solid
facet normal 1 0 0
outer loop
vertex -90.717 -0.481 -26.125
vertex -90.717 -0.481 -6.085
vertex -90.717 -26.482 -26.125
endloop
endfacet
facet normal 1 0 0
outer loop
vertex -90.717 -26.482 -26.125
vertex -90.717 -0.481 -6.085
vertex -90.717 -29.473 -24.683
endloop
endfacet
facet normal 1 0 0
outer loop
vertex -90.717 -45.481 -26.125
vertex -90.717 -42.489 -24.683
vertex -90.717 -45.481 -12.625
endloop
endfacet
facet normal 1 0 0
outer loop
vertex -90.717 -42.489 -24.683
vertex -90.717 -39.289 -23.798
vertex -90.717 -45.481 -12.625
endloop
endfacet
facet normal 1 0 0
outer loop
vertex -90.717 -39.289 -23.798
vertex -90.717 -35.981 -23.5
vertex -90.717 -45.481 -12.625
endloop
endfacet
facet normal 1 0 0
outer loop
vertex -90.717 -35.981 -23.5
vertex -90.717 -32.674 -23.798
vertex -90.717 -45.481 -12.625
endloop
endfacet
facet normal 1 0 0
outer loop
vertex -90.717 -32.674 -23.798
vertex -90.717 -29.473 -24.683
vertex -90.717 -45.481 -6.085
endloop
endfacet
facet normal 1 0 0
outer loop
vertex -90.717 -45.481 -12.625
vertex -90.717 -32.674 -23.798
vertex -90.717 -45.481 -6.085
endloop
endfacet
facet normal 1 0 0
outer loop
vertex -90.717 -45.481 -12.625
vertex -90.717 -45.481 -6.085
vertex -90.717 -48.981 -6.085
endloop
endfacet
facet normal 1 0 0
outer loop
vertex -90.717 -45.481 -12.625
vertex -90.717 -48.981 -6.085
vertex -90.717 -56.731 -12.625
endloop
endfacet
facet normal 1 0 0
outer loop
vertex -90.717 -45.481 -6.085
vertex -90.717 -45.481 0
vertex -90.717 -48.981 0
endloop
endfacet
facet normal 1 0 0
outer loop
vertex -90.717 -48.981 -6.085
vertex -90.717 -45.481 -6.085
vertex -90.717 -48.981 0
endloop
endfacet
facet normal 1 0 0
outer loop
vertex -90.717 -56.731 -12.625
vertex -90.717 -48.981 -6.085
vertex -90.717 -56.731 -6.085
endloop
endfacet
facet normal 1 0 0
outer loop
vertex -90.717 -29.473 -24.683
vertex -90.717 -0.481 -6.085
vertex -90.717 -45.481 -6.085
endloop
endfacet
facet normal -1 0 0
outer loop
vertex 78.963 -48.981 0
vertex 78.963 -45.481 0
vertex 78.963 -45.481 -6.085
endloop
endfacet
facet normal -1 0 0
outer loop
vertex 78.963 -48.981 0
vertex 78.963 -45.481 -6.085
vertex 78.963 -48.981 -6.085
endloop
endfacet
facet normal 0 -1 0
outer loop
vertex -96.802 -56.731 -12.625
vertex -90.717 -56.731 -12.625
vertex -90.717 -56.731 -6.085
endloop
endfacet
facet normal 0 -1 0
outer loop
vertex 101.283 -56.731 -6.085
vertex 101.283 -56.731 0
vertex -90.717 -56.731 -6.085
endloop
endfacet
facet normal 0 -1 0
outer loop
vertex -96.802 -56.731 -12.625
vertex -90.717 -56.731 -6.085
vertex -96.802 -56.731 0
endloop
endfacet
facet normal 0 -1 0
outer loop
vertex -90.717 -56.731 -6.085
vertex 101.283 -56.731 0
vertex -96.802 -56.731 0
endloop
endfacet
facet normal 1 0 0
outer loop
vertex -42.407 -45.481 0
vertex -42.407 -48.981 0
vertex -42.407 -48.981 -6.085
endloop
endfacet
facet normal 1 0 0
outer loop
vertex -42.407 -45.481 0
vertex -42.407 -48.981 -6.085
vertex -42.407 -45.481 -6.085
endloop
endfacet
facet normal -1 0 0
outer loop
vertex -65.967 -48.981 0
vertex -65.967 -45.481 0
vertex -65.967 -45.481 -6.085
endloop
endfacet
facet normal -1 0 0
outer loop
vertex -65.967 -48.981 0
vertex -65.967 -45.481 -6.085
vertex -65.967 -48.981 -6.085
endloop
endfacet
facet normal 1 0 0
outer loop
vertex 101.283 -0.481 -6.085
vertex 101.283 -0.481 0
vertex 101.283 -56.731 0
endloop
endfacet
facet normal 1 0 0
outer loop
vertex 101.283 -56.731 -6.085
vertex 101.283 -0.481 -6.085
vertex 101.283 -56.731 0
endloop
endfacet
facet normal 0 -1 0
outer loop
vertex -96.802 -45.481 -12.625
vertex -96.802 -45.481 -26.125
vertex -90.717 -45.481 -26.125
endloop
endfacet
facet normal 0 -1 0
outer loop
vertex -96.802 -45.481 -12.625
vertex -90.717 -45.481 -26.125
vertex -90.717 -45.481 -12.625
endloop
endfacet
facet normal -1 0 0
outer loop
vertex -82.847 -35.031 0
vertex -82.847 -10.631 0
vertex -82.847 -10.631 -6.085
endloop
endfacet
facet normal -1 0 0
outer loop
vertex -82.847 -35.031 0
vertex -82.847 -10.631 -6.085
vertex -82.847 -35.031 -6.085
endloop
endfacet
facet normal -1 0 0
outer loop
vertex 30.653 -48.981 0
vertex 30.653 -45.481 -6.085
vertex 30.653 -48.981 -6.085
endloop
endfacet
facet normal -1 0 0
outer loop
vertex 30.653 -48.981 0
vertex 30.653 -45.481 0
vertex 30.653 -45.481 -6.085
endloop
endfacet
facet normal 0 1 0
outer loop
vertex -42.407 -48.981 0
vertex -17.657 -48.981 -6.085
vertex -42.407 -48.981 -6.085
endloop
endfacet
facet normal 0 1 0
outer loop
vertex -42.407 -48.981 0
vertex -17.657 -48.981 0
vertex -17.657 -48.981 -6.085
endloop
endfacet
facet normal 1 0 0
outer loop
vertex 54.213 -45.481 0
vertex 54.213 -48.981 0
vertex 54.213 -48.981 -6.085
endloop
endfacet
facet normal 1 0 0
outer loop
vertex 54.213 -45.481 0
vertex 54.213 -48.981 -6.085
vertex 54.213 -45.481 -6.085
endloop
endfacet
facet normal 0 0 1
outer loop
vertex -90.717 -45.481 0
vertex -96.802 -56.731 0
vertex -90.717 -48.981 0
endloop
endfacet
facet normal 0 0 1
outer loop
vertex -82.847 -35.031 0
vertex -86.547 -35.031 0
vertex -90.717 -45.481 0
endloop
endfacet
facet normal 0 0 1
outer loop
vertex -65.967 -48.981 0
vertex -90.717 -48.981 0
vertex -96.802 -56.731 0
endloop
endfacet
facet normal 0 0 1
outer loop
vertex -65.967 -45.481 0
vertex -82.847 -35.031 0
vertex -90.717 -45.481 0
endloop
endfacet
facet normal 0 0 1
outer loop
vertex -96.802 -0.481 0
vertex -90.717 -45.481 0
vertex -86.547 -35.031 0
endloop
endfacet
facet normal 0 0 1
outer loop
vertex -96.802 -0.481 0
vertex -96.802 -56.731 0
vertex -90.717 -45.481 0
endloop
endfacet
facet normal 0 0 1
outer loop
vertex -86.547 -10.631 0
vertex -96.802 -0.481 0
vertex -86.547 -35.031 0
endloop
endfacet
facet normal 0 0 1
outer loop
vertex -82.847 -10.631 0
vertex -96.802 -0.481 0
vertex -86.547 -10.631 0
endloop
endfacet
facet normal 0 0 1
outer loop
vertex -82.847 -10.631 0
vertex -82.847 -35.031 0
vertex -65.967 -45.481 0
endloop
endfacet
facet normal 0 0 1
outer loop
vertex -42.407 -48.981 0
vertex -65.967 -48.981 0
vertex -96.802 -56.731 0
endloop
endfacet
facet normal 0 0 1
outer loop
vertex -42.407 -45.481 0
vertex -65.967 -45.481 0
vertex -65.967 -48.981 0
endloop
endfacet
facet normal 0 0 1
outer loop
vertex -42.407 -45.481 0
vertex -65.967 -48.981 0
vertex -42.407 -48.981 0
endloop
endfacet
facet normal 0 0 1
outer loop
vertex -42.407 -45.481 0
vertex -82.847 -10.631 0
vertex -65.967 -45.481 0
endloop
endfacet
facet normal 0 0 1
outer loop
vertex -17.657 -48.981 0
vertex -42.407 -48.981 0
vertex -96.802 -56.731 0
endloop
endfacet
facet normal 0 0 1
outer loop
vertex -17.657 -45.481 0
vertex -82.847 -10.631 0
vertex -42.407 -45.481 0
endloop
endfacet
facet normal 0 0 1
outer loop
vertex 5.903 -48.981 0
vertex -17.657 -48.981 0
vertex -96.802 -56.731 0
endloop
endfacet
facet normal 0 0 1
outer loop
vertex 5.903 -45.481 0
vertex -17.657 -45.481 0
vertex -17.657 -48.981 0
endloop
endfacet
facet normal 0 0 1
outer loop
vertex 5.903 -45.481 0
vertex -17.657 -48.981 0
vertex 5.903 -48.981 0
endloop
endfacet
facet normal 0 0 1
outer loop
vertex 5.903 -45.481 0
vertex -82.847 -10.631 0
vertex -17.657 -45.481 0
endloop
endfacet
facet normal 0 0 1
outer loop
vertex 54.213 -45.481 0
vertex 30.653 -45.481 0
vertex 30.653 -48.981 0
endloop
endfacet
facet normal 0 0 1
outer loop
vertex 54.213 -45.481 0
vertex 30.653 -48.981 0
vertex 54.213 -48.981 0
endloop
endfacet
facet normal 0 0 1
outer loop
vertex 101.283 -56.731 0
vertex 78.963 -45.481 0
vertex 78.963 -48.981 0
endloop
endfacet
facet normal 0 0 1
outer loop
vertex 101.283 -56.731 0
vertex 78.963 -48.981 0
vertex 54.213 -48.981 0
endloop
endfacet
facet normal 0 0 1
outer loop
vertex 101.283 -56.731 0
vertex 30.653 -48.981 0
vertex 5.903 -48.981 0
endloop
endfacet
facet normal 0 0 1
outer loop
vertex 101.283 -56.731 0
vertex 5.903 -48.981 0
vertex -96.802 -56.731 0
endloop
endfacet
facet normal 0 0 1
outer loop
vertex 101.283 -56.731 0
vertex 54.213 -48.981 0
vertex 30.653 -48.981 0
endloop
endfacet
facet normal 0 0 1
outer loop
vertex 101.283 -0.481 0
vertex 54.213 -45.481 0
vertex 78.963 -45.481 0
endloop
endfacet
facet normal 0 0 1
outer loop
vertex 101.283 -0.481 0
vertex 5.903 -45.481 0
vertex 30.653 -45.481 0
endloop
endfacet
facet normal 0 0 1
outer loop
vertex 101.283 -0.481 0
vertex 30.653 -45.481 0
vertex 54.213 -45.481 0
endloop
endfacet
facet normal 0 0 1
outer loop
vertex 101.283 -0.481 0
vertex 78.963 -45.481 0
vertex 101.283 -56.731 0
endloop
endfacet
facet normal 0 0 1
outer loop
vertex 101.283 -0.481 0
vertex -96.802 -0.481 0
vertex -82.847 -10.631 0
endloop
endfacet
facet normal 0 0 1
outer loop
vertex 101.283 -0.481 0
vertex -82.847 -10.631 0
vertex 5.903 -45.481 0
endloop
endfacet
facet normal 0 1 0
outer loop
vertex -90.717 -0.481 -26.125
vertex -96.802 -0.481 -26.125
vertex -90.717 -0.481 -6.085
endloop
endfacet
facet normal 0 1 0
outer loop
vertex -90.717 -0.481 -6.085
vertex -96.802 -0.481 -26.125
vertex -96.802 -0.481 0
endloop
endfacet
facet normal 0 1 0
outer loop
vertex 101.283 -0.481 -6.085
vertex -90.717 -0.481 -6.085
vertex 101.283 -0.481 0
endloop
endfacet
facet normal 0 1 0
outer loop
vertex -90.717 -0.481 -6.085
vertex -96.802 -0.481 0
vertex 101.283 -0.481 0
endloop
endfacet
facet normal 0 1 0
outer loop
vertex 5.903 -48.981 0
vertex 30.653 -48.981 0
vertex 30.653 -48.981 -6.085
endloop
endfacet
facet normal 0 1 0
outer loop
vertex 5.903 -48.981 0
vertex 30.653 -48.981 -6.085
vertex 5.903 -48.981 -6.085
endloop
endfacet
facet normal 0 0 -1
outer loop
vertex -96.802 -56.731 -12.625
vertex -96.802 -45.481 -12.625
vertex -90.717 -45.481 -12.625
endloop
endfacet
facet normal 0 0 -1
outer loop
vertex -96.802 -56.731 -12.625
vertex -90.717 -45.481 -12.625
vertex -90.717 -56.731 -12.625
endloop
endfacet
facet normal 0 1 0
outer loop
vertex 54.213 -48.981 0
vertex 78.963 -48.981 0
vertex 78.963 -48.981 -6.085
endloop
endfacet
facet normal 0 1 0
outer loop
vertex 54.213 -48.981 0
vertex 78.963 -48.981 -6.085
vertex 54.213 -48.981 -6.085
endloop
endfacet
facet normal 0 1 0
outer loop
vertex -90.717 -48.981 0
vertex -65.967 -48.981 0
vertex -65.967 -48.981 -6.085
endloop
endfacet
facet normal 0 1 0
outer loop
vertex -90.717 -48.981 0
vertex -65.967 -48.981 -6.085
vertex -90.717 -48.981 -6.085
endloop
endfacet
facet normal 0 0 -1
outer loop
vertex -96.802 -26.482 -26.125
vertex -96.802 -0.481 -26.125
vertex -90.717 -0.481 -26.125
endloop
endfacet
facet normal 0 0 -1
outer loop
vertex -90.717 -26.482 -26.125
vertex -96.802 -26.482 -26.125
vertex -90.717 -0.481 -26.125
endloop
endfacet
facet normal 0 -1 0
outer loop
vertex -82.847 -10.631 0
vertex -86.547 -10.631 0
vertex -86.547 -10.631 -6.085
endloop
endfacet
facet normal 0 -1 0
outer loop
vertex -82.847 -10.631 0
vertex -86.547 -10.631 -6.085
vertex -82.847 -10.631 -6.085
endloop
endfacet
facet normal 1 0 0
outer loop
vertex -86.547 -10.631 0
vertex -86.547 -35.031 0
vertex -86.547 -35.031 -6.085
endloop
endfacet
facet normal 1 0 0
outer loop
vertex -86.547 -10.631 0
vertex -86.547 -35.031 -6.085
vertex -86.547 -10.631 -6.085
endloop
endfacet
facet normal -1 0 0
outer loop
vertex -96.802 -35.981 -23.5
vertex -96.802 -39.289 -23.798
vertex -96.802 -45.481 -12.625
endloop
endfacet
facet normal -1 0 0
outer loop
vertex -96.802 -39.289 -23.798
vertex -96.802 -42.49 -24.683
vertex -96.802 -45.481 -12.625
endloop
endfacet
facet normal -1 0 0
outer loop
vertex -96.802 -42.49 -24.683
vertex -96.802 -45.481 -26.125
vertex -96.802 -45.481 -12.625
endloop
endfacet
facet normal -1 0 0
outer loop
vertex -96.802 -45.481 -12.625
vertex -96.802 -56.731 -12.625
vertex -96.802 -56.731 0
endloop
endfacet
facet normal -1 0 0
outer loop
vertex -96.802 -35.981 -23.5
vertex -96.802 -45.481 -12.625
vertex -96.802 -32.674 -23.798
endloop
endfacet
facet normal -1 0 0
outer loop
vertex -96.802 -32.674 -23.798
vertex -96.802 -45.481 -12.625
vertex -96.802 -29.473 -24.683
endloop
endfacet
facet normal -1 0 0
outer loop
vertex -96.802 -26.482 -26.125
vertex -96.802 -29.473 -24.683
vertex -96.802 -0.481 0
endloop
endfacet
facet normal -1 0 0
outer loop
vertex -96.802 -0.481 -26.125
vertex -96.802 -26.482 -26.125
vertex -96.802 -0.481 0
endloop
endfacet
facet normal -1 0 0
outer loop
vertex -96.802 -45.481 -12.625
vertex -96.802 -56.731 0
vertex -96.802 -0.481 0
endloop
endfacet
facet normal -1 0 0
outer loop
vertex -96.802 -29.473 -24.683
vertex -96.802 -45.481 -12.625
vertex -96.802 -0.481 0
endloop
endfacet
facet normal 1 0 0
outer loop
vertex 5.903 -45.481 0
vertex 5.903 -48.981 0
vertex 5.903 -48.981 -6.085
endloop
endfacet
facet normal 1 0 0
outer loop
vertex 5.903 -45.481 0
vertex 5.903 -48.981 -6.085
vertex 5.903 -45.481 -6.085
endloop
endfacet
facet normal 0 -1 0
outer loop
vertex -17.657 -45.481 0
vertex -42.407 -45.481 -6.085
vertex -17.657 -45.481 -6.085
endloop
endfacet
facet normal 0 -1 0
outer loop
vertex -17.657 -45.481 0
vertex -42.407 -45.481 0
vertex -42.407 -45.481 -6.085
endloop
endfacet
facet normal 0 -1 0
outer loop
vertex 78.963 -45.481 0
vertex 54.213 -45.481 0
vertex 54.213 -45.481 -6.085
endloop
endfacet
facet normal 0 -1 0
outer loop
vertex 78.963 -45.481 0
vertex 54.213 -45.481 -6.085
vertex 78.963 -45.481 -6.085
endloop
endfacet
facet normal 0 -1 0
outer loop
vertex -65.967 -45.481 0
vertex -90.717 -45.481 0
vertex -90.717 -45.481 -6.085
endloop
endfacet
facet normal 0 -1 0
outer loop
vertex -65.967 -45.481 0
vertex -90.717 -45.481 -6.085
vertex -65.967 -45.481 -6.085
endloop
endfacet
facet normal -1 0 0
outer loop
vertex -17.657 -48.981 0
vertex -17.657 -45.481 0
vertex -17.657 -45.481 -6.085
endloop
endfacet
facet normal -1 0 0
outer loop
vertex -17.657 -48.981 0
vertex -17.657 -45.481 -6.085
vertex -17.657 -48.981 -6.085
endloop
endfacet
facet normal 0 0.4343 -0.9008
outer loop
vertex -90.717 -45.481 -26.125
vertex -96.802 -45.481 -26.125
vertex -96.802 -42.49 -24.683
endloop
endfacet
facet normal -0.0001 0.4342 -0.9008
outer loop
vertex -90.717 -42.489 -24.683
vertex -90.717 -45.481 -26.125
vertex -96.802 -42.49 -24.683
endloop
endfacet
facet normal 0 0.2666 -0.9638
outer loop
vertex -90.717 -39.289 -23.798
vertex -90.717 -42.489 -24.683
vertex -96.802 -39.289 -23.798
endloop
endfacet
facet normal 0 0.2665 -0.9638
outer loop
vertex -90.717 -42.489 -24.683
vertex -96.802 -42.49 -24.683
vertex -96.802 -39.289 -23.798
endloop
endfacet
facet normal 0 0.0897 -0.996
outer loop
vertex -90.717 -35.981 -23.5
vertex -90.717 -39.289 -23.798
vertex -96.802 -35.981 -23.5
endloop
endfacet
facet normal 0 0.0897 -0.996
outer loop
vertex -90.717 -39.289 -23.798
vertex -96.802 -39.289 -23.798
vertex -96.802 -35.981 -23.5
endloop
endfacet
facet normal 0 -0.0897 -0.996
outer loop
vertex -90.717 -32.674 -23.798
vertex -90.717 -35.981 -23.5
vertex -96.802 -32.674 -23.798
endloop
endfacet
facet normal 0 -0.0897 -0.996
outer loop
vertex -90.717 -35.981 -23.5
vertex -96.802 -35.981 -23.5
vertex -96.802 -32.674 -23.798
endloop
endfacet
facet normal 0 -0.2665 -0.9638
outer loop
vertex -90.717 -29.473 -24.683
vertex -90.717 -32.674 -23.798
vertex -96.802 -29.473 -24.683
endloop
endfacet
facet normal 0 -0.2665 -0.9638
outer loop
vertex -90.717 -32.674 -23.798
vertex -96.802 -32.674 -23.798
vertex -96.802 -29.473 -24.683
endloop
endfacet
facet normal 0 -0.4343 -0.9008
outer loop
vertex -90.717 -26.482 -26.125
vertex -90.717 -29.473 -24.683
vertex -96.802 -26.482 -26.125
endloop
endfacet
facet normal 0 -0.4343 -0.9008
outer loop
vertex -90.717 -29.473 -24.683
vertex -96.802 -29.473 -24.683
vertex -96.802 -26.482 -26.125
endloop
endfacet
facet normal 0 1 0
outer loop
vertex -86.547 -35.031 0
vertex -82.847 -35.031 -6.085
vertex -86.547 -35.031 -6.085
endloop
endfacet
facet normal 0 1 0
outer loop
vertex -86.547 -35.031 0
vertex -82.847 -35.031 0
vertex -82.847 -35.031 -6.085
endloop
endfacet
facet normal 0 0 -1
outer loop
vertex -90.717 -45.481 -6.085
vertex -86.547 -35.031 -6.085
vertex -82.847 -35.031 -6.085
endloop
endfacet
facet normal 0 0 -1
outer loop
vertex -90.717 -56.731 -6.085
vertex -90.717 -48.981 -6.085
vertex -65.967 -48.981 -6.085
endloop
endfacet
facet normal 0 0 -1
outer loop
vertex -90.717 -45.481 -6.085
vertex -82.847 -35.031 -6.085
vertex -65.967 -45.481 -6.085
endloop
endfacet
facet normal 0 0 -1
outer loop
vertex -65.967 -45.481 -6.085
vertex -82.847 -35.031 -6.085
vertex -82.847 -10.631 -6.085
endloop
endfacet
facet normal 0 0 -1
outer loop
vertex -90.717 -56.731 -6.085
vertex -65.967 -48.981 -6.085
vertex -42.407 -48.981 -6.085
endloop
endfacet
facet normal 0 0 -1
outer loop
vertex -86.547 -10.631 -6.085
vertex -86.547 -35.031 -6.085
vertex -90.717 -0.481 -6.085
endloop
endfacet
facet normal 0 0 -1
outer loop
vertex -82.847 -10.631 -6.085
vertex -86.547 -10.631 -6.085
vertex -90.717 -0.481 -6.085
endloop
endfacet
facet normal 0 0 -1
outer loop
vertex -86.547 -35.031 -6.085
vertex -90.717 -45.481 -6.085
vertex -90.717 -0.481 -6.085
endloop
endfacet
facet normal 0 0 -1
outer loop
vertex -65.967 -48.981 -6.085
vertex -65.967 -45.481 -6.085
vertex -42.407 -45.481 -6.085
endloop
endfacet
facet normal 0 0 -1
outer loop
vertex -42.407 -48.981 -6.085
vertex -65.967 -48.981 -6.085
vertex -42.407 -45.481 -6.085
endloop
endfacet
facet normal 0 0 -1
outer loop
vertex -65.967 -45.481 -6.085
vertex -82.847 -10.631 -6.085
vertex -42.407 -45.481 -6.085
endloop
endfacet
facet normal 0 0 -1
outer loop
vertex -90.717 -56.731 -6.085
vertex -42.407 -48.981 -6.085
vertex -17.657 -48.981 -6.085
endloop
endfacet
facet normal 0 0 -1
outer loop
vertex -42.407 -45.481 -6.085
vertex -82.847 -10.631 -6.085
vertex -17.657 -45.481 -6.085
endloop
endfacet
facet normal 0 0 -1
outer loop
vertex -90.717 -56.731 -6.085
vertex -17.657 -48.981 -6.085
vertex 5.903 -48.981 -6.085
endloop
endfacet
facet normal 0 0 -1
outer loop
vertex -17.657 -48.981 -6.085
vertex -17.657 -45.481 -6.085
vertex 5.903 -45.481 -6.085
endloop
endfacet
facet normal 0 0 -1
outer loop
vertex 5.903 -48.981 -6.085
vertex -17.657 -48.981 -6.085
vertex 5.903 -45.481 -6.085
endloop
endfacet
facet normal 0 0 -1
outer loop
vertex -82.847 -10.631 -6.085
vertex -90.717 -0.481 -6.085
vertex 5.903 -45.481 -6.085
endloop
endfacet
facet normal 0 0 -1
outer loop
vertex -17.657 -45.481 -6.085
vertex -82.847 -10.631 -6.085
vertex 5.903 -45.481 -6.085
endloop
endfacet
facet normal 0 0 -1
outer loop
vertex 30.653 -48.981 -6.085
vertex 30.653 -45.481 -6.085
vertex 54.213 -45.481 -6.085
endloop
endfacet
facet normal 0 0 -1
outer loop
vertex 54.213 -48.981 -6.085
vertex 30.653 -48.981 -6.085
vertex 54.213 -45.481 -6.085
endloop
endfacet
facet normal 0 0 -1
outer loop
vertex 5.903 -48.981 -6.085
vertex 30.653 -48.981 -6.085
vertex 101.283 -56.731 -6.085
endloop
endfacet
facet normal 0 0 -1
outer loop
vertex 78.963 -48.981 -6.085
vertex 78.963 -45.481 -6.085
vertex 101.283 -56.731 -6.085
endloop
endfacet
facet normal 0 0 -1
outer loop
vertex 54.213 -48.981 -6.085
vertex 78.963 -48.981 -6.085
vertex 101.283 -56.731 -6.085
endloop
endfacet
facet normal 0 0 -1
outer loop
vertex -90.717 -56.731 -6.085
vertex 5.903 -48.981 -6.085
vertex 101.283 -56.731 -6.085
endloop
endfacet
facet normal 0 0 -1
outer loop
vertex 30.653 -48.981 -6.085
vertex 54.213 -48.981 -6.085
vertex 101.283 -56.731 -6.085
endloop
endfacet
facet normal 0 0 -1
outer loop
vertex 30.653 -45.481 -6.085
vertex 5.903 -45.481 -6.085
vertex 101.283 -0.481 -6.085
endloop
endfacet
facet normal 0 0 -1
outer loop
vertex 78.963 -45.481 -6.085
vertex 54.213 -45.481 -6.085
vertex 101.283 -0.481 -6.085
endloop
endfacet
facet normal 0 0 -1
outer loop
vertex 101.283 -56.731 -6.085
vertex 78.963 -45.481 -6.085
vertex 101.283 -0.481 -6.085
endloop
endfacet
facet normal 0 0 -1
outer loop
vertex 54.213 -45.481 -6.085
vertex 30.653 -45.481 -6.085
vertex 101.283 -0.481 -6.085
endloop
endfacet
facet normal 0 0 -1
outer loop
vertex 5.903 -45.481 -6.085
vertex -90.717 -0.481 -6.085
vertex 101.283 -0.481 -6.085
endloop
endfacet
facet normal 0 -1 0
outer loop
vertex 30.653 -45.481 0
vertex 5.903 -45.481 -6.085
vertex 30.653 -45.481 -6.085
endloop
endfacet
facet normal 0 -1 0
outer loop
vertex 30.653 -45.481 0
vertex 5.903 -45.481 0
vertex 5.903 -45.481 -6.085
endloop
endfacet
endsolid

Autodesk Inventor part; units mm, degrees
ref_plane "YZ Plane" through (0, 0, 0) normal (1, 0, 0) x (0, 1, 0)
ref_plane "XZ Plane" through (0, 0, 0) normal (0, 1, 0) x (-1, 0, 0)
ref_plane "XY Plane" through (0, 0, 0) normal (0, 0, 1) x (1, 0, 0)
sketch "Sketch1" plane through (0, 0, 0) normal (0, 0, 1) x (1, 0, 0)
  line L0 (-96.8016, -0.4814) -> (101.2834, -0.4814)
  line L1 (101.2834, -0.4814) -> (101.2834, -56.7314)
  line L2 (101.2834, -56.7314) -> (-96.8016, -56.7314)
  line L3 (-96.8016, -56.7314) -> (-96.8016, -0.4814)
  line L4 (-96.8016, -0.4814) -> (-90.7166, -0.4814)
  line L5 (-90.7166, -0.4814) -> (-90.7166, -56.7314)
  line L6 (-90.7166, -56.7314) -> (-96.8016, -56.7314)
  line L7 (-96.8016, -56.7314) -> (-96.8016, -0.4814)
  line L8 (-86.5466, -10.6314) -> (-82.8466, -10.6314)
  line L9 (-82.8466, -10.6314) -> (-82.8466, -35.0314)
  line L10 (-82.8466, -35.0314) -> (-86.5466, -35.0314)
  line L11 (-86.5466, -35.0314) -> (-86.5466, -10.6314)
  line L12 (-90.7166, -45.4814) -> (-65.9666, -45.4814)
  line L13 (-65.9666, -45.4814) -> (-65.9666, -48.9814)
  line L14 (-65.9666, -48.9814) -> (-90.7166, -48.9814)
  line L15 (-90.7166, -48.9814) -> (-90.7166, -45.4814)
  line L16 (-17.6566, -45.4814) -> (-17.6566, -48.9814)
  line L17 (-17.6566, -48.9814) -> (-42.4066, -48.9814)
  line L18 (-42.4066, -48.9814) -> (-42.4066, -45.4814)
  line L19 (-42.4066, -45.4814) -> (-17.6566, -45.4814)
  line L20 (30.6534, -45.4814) -> (30.6534, -48.9814)
  line L21 (30.6534, -48.9814) -> (5.9034, -48.9814)
  line L22 (5.9034, -48.9814) -> (5.9034, -45.4814)
  line L23 (5.9034, -45.4814) -> (30.6534, -45.4814)
  line L24 (78.9634, -45.4814) -> (78.9634, -48.9814)
  line L25 (78.9634, -48.9814) -> (54.2134, -48.9814)
  line L26 (54.2134, -48.9814) -> (54.2134, -45.4814)
  line L27 (54.2134, -45.4814) -> (78.9634, -45.4814)
  point P0 (0, 0)
  dimension "d0" = 198.085
  dimension "d1" = 56.25
  dimension "d2" = 0
  dimension "d3" = 0
  dimension "d4" = 0
  dimension "d5" = 6.085
  dimension "d6" = 4.17
  dimension "d7" = 10.15
  dimension "d8" = 3.7
  dimension "d9" = 24.4
  dimension "d10" = 7.75
  dimension "d11" = 0
  dimension "d12" = 24.75
  dimension "d15" = 48.31
  dimension "d20" = 3.5
extrude "Extrusion1" add sketch "Sketch1" against normal blind 6.085 contours L0 L1 L2 L5 L14 L13 L12
extrude "Extrusion2" add sketch "Sketch1" against normal blind 26.125 contours L0 L5 L2 L3
sketch "Sketch2" plane through (-96.8016, -56.7314, 0) normal (-1, 0, 0) x (0, 0, 1)
  line L0 (0, 0) -> (-84, 0)
  circle A0 centre (-42, 20.75) radius 18.5
  point P0 (0, 56.7314)
  dimension "d25" = 84
  dimension "d26" = 37
  dimension "d27" = 20.75
extrude "Extrusion3" cut sketch "Sketch2" against normal blind 26.125
sketch "Sketch3" plane through (-96.8016, -56.7314, 0) normal (-1, 0, 0) x (0, 0, 1)
  line L0 (-68.8984, 11.25) -> (-12.625, 11.25)
  line L1 (-12.625, 11.25) -> (-12.625, -13.0392)
  line L2 (-12.625, -13.0392) -> (-68.8984, -13.0392)
  line L3 (-68.8984, -13.0392) -> (-68.8984, 11.25)
  line L4 (-26.125, 0) -> (-26.125, 11.2508) projected
  line L5 (0, 0) -> (-26.125, 0) projected
  point P0 (0, 56.7314)
  dimension "d30" = 13.5
  dimension "d31" = 11.25
extrude "Extrusion4" cut sketch "Sketch3" against normal blind 10
properties part number "side frame left"
